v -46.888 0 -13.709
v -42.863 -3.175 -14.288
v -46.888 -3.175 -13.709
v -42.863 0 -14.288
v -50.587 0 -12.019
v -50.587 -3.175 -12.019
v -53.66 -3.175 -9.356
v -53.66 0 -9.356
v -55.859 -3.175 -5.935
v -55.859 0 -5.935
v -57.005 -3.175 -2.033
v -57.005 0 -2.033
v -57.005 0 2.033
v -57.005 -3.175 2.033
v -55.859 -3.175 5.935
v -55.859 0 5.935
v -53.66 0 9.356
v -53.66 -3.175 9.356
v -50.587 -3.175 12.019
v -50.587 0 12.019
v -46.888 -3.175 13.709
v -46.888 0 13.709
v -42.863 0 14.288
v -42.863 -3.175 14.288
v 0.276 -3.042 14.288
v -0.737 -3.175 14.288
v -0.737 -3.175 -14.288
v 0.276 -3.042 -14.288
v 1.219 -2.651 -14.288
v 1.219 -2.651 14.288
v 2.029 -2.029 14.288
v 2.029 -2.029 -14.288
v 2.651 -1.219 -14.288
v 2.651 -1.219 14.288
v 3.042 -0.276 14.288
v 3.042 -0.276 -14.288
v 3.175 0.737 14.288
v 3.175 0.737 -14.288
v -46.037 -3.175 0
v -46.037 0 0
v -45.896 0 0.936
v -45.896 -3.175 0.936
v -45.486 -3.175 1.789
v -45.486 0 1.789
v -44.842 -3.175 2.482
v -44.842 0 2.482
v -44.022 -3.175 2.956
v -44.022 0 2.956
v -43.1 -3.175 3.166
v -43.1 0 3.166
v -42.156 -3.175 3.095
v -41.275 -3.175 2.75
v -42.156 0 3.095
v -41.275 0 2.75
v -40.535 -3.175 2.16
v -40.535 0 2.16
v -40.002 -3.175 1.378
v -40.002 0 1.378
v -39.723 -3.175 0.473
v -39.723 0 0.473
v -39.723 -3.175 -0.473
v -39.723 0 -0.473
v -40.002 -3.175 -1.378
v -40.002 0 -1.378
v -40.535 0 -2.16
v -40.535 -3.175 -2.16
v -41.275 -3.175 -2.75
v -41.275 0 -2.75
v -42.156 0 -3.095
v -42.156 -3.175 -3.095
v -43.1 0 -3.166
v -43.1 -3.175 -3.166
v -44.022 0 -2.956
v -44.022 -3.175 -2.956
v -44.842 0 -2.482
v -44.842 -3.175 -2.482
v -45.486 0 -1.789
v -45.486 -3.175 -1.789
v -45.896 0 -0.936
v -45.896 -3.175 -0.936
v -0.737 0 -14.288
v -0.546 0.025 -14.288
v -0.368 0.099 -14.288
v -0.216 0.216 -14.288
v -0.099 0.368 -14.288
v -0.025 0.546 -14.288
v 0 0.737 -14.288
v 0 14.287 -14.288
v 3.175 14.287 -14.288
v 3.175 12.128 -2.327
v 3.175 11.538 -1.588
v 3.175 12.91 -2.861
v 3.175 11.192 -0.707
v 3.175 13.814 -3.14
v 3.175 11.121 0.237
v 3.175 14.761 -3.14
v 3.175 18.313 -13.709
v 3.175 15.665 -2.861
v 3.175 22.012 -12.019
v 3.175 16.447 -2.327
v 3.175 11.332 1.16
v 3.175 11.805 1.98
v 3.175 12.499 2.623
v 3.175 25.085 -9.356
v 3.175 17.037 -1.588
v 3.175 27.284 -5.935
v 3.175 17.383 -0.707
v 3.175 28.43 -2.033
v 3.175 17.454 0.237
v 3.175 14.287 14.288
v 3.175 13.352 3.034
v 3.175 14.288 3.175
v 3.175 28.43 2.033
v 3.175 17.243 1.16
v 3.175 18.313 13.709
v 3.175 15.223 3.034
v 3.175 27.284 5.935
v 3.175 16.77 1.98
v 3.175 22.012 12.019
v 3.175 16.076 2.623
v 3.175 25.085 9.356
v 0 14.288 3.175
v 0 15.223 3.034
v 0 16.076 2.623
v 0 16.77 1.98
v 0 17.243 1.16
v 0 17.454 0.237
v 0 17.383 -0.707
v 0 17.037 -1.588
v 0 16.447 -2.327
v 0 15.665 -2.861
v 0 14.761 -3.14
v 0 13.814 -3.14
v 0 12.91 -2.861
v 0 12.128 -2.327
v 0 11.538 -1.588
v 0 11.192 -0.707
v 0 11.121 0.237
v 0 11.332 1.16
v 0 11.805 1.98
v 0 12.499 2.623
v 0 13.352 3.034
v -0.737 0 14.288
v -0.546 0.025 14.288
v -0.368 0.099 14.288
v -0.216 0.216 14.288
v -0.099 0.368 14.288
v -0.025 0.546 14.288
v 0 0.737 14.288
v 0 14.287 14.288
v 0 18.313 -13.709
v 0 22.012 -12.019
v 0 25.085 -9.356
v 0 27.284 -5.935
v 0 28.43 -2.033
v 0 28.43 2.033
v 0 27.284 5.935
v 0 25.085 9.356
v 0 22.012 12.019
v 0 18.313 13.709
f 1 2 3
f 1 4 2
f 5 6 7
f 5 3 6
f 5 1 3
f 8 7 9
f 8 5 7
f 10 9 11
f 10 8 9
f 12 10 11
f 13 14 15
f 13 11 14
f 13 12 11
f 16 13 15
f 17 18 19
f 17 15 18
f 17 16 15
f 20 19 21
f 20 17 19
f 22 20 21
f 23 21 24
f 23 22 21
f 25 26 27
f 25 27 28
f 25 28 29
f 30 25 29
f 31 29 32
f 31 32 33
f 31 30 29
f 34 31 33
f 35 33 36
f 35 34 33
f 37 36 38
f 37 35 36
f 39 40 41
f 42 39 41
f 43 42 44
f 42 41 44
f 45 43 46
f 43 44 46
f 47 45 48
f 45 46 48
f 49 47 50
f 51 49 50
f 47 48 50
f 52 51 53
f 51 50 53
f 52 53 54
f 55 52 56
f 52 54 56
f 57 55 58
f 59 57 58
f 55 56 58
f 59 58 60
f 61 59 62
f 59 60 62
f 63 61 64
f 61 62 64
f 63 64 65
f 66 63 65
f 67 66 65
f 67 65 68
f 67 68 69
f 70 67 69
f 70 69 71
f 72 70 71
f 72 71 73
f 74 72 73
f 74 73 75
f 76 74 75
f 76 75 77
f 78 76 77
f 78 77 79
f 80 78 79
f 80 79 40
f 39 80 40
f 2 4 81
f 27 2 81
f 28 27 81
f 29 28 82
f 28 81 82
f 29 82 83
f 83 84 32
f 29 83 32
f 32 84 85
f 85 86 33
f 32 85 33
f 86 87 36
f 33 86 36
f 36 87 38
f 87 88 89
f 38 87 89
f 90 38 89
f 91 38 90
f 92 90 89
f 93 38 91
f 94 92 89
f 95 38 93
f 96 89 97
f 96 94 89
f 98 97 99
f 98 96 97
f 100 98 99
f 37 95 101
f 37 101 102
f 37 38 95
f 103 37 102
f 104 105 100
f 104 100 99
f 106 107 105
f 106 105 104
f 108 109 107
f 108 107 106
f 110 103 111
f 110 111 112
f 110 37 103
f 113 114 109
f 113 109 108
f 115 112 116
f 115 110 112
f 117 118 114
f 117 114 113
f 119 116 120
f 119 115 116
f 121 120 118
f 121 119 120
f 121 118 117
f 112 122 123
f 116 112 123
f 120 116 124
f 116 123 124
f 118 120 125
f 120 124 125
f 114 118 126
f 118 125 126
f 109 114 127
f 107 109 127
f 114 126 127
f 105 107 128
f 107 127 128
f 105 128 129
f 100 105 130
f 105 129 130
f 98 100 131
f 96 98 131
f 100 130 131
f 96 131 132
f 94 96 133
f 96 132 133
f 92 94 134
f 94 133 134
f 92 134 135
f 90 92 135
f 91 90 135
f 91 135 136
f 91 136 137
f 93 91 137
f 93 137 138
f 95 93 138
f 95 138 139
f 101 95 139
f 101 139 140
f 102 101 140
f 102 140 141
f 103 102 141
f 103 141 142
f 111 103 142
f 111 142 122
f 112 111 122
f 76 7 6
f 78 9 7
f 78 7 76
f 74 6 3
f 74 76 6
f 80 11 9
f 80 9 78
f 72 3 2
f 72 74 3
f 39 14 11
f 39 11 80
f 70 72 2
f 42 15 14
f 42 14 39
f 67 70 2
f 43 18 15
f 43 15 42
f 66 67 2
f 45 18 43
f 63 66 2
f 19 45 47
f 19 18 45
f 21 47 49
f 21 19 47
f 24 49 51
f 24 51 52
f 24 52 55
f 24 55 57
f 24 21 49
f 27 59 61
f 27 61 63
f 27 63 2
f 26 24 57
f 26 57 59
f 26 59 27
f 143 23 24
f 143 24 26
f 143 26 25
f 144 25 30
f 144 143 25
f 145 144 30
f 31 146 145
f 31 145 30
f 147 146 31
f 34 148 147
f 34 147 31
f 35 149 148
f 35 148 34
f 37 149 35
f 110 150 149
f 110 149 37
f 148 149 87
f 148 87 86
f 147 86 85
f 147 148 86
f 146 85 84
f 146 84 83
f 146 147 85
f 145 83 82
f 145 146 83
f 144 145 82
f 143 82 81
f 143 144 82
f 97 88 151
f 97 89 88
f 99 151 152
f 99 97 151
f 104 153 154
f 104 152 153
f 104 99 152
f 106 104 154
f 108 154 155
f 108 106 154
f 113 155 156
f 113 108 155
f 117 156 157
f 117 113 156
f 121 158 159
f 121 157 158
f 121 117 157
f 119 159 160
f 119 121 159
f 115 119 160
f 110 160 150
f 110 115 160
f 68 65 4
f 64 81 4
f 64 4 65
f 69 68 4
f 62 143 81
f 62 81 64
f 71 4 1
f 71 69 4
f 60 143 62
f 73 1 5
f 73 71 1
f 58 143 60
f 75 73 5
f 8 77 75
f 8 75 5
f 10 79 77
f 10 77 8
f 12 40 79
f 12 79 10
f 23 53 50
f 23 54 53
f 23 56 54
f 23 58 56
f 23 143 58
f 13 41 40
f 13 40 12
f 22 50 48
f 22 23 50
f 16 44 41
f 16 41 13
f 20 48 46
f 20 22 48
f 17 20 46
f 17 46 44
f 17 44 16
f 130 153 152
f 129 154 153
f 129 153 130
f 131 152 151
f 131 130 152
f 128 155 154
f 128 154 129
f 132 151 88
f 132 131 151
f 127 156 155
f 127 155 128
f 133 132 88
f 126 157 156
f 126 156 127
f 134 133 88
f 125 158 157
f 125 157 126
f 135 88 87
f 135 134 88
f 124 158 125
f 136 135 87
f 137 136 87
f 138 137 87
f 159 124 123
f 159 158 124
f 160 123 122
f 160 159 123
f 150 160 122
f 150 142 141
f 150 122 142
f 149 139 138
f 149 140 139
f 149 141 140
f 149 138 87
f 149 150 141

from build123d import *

# Parameters (mm, degrees)
BASE_FLANGE1_DEPTH = 14.2875
SKETCH6_R          = 3.175
CUT_EXTRUDE1_DEPTH = 66.473550242
SKETCH7_R          = 3.175
CUT_EXTRUDE2_DEPTH = 66.473550242
FILLET2_RADIUS     = 14.2875
FILLET2_LENGTH     = 3.175
FILLET3_RADIUS     = 14.2875
FILLET3_LENGTH     = 3.175


# Sheet-metal steps are written as plain solids
with BuildPart() as part:
    # Sketch1 → Base-Flange1 (new, symmetric)
    with BuildSketch(Plane.XY):
        with BuildLine():
            Line((0, 28.575), (0, 0.7366))
            ThreePointArc((0, 0.7366), (-0.215745145, 0.215745145), (-0.7366, 0))
            Line((-0.7366, 0), (-57.15, 0))
            Line((-57.15, 0), (-57.15, -3.175))
            Line((-57.15, -3.175), (-0.7366, -3.175))
            ThreePointArc((-0.7366, -3.175), (2.029318885, -2.029318885), (3.175, 0.7366))
            Line((3.175, 0.7366), (3.175, 28.575))
            Line((3.175, 28.575), (0, 28.575))
        make_face()
    extrude(amount=BASE_FLANGE1_DEPTH, both=True)

    # Sketch6 → Cut-Extrude1 (cut, through all)
    with BuildSketch(Plane(origin=(0, 0, 0), x_dir=(1, 0, 0), z_dir=(0, 1, 0))):
        with Locations(Location((-42.8625, 0, 0), (0, 0, 180))):
            Circle(SKETCH6_R)
    extrude(amount=-CUT_EXTRUDE1_DEPTH, mode=Mode.SUBTRACT)

    # Sketch7 → Cut-Extrude2 (cut, through all)
    with BuildSketch(Plane.ZY):
        with Locations((0, 14.2875)):
            Circle(SKETCH7_R)
    extrude(amount=-CUT_EXTRUDE2_DEPTH, mode=Mode.SUBTRACT)

    # Fillet2: full round fillet: the end face becomes a half cylinder, R = half its width
    fillet2_face = Plane((-57.15, -1.5875, 0), x_dir=(0, 1, 0), z_dir=(-1, 0, 0))  # on the end face: x along it, z out of the body
    fillet2_slab = fillet2_face.offset(-FILLET2_RADIUS / 2) * Box(FILLET2_LENGTH, 2 * FILLET2_RADIUS, FILLET2_RADIUS, mode=Mode.PRIVATE)  # the body's end, R deep
    fillet2_round = Plane((-42.8625, -1.5875, 0), x_dir=(-1, 0, 0), z_dir=(0, 1, 0)) * Cylinder(FILLET2_RADIUS, FILLET2_LENGTH, mode=Mode.PRIVATE)  # its axis R under the face
    add(fillet2_slab - fillet2_round, mode=Mode.SUBTRACT)

    # Fillet3: full round fillet: the end face becomes a half cylinder, R = half its width
    fillet3_face = Plane((1.5875, 28.575, 0), x_dir=(1, 0, 0), z_dir=(0, 1, 0))  # on the end face: x along it, z out of the body
    fillet3_slab = fillet3_face.offset(-FILLET3_RADIUS / 2) * Box(FILLET3_LENGTH, 2 * FILLET3_RADIUS, FILLET3_RADIUS, mode=Mode.PRIVATE)  # the body's end, R deep
    fillet3_round = Plane((1.5875, 14.2875, 0), x_dir=(0, 1, 0), z_dir=(1, 0, 0)) * Cylinder(FILLET3_RADIUS, FILLET3_LENGTH, mode=Mode.PRIVATE)  # its axis R under the face
    add(fillet3_slab - fillet3_round, mode=Mode.SUBTRACT)


solid = part.part
